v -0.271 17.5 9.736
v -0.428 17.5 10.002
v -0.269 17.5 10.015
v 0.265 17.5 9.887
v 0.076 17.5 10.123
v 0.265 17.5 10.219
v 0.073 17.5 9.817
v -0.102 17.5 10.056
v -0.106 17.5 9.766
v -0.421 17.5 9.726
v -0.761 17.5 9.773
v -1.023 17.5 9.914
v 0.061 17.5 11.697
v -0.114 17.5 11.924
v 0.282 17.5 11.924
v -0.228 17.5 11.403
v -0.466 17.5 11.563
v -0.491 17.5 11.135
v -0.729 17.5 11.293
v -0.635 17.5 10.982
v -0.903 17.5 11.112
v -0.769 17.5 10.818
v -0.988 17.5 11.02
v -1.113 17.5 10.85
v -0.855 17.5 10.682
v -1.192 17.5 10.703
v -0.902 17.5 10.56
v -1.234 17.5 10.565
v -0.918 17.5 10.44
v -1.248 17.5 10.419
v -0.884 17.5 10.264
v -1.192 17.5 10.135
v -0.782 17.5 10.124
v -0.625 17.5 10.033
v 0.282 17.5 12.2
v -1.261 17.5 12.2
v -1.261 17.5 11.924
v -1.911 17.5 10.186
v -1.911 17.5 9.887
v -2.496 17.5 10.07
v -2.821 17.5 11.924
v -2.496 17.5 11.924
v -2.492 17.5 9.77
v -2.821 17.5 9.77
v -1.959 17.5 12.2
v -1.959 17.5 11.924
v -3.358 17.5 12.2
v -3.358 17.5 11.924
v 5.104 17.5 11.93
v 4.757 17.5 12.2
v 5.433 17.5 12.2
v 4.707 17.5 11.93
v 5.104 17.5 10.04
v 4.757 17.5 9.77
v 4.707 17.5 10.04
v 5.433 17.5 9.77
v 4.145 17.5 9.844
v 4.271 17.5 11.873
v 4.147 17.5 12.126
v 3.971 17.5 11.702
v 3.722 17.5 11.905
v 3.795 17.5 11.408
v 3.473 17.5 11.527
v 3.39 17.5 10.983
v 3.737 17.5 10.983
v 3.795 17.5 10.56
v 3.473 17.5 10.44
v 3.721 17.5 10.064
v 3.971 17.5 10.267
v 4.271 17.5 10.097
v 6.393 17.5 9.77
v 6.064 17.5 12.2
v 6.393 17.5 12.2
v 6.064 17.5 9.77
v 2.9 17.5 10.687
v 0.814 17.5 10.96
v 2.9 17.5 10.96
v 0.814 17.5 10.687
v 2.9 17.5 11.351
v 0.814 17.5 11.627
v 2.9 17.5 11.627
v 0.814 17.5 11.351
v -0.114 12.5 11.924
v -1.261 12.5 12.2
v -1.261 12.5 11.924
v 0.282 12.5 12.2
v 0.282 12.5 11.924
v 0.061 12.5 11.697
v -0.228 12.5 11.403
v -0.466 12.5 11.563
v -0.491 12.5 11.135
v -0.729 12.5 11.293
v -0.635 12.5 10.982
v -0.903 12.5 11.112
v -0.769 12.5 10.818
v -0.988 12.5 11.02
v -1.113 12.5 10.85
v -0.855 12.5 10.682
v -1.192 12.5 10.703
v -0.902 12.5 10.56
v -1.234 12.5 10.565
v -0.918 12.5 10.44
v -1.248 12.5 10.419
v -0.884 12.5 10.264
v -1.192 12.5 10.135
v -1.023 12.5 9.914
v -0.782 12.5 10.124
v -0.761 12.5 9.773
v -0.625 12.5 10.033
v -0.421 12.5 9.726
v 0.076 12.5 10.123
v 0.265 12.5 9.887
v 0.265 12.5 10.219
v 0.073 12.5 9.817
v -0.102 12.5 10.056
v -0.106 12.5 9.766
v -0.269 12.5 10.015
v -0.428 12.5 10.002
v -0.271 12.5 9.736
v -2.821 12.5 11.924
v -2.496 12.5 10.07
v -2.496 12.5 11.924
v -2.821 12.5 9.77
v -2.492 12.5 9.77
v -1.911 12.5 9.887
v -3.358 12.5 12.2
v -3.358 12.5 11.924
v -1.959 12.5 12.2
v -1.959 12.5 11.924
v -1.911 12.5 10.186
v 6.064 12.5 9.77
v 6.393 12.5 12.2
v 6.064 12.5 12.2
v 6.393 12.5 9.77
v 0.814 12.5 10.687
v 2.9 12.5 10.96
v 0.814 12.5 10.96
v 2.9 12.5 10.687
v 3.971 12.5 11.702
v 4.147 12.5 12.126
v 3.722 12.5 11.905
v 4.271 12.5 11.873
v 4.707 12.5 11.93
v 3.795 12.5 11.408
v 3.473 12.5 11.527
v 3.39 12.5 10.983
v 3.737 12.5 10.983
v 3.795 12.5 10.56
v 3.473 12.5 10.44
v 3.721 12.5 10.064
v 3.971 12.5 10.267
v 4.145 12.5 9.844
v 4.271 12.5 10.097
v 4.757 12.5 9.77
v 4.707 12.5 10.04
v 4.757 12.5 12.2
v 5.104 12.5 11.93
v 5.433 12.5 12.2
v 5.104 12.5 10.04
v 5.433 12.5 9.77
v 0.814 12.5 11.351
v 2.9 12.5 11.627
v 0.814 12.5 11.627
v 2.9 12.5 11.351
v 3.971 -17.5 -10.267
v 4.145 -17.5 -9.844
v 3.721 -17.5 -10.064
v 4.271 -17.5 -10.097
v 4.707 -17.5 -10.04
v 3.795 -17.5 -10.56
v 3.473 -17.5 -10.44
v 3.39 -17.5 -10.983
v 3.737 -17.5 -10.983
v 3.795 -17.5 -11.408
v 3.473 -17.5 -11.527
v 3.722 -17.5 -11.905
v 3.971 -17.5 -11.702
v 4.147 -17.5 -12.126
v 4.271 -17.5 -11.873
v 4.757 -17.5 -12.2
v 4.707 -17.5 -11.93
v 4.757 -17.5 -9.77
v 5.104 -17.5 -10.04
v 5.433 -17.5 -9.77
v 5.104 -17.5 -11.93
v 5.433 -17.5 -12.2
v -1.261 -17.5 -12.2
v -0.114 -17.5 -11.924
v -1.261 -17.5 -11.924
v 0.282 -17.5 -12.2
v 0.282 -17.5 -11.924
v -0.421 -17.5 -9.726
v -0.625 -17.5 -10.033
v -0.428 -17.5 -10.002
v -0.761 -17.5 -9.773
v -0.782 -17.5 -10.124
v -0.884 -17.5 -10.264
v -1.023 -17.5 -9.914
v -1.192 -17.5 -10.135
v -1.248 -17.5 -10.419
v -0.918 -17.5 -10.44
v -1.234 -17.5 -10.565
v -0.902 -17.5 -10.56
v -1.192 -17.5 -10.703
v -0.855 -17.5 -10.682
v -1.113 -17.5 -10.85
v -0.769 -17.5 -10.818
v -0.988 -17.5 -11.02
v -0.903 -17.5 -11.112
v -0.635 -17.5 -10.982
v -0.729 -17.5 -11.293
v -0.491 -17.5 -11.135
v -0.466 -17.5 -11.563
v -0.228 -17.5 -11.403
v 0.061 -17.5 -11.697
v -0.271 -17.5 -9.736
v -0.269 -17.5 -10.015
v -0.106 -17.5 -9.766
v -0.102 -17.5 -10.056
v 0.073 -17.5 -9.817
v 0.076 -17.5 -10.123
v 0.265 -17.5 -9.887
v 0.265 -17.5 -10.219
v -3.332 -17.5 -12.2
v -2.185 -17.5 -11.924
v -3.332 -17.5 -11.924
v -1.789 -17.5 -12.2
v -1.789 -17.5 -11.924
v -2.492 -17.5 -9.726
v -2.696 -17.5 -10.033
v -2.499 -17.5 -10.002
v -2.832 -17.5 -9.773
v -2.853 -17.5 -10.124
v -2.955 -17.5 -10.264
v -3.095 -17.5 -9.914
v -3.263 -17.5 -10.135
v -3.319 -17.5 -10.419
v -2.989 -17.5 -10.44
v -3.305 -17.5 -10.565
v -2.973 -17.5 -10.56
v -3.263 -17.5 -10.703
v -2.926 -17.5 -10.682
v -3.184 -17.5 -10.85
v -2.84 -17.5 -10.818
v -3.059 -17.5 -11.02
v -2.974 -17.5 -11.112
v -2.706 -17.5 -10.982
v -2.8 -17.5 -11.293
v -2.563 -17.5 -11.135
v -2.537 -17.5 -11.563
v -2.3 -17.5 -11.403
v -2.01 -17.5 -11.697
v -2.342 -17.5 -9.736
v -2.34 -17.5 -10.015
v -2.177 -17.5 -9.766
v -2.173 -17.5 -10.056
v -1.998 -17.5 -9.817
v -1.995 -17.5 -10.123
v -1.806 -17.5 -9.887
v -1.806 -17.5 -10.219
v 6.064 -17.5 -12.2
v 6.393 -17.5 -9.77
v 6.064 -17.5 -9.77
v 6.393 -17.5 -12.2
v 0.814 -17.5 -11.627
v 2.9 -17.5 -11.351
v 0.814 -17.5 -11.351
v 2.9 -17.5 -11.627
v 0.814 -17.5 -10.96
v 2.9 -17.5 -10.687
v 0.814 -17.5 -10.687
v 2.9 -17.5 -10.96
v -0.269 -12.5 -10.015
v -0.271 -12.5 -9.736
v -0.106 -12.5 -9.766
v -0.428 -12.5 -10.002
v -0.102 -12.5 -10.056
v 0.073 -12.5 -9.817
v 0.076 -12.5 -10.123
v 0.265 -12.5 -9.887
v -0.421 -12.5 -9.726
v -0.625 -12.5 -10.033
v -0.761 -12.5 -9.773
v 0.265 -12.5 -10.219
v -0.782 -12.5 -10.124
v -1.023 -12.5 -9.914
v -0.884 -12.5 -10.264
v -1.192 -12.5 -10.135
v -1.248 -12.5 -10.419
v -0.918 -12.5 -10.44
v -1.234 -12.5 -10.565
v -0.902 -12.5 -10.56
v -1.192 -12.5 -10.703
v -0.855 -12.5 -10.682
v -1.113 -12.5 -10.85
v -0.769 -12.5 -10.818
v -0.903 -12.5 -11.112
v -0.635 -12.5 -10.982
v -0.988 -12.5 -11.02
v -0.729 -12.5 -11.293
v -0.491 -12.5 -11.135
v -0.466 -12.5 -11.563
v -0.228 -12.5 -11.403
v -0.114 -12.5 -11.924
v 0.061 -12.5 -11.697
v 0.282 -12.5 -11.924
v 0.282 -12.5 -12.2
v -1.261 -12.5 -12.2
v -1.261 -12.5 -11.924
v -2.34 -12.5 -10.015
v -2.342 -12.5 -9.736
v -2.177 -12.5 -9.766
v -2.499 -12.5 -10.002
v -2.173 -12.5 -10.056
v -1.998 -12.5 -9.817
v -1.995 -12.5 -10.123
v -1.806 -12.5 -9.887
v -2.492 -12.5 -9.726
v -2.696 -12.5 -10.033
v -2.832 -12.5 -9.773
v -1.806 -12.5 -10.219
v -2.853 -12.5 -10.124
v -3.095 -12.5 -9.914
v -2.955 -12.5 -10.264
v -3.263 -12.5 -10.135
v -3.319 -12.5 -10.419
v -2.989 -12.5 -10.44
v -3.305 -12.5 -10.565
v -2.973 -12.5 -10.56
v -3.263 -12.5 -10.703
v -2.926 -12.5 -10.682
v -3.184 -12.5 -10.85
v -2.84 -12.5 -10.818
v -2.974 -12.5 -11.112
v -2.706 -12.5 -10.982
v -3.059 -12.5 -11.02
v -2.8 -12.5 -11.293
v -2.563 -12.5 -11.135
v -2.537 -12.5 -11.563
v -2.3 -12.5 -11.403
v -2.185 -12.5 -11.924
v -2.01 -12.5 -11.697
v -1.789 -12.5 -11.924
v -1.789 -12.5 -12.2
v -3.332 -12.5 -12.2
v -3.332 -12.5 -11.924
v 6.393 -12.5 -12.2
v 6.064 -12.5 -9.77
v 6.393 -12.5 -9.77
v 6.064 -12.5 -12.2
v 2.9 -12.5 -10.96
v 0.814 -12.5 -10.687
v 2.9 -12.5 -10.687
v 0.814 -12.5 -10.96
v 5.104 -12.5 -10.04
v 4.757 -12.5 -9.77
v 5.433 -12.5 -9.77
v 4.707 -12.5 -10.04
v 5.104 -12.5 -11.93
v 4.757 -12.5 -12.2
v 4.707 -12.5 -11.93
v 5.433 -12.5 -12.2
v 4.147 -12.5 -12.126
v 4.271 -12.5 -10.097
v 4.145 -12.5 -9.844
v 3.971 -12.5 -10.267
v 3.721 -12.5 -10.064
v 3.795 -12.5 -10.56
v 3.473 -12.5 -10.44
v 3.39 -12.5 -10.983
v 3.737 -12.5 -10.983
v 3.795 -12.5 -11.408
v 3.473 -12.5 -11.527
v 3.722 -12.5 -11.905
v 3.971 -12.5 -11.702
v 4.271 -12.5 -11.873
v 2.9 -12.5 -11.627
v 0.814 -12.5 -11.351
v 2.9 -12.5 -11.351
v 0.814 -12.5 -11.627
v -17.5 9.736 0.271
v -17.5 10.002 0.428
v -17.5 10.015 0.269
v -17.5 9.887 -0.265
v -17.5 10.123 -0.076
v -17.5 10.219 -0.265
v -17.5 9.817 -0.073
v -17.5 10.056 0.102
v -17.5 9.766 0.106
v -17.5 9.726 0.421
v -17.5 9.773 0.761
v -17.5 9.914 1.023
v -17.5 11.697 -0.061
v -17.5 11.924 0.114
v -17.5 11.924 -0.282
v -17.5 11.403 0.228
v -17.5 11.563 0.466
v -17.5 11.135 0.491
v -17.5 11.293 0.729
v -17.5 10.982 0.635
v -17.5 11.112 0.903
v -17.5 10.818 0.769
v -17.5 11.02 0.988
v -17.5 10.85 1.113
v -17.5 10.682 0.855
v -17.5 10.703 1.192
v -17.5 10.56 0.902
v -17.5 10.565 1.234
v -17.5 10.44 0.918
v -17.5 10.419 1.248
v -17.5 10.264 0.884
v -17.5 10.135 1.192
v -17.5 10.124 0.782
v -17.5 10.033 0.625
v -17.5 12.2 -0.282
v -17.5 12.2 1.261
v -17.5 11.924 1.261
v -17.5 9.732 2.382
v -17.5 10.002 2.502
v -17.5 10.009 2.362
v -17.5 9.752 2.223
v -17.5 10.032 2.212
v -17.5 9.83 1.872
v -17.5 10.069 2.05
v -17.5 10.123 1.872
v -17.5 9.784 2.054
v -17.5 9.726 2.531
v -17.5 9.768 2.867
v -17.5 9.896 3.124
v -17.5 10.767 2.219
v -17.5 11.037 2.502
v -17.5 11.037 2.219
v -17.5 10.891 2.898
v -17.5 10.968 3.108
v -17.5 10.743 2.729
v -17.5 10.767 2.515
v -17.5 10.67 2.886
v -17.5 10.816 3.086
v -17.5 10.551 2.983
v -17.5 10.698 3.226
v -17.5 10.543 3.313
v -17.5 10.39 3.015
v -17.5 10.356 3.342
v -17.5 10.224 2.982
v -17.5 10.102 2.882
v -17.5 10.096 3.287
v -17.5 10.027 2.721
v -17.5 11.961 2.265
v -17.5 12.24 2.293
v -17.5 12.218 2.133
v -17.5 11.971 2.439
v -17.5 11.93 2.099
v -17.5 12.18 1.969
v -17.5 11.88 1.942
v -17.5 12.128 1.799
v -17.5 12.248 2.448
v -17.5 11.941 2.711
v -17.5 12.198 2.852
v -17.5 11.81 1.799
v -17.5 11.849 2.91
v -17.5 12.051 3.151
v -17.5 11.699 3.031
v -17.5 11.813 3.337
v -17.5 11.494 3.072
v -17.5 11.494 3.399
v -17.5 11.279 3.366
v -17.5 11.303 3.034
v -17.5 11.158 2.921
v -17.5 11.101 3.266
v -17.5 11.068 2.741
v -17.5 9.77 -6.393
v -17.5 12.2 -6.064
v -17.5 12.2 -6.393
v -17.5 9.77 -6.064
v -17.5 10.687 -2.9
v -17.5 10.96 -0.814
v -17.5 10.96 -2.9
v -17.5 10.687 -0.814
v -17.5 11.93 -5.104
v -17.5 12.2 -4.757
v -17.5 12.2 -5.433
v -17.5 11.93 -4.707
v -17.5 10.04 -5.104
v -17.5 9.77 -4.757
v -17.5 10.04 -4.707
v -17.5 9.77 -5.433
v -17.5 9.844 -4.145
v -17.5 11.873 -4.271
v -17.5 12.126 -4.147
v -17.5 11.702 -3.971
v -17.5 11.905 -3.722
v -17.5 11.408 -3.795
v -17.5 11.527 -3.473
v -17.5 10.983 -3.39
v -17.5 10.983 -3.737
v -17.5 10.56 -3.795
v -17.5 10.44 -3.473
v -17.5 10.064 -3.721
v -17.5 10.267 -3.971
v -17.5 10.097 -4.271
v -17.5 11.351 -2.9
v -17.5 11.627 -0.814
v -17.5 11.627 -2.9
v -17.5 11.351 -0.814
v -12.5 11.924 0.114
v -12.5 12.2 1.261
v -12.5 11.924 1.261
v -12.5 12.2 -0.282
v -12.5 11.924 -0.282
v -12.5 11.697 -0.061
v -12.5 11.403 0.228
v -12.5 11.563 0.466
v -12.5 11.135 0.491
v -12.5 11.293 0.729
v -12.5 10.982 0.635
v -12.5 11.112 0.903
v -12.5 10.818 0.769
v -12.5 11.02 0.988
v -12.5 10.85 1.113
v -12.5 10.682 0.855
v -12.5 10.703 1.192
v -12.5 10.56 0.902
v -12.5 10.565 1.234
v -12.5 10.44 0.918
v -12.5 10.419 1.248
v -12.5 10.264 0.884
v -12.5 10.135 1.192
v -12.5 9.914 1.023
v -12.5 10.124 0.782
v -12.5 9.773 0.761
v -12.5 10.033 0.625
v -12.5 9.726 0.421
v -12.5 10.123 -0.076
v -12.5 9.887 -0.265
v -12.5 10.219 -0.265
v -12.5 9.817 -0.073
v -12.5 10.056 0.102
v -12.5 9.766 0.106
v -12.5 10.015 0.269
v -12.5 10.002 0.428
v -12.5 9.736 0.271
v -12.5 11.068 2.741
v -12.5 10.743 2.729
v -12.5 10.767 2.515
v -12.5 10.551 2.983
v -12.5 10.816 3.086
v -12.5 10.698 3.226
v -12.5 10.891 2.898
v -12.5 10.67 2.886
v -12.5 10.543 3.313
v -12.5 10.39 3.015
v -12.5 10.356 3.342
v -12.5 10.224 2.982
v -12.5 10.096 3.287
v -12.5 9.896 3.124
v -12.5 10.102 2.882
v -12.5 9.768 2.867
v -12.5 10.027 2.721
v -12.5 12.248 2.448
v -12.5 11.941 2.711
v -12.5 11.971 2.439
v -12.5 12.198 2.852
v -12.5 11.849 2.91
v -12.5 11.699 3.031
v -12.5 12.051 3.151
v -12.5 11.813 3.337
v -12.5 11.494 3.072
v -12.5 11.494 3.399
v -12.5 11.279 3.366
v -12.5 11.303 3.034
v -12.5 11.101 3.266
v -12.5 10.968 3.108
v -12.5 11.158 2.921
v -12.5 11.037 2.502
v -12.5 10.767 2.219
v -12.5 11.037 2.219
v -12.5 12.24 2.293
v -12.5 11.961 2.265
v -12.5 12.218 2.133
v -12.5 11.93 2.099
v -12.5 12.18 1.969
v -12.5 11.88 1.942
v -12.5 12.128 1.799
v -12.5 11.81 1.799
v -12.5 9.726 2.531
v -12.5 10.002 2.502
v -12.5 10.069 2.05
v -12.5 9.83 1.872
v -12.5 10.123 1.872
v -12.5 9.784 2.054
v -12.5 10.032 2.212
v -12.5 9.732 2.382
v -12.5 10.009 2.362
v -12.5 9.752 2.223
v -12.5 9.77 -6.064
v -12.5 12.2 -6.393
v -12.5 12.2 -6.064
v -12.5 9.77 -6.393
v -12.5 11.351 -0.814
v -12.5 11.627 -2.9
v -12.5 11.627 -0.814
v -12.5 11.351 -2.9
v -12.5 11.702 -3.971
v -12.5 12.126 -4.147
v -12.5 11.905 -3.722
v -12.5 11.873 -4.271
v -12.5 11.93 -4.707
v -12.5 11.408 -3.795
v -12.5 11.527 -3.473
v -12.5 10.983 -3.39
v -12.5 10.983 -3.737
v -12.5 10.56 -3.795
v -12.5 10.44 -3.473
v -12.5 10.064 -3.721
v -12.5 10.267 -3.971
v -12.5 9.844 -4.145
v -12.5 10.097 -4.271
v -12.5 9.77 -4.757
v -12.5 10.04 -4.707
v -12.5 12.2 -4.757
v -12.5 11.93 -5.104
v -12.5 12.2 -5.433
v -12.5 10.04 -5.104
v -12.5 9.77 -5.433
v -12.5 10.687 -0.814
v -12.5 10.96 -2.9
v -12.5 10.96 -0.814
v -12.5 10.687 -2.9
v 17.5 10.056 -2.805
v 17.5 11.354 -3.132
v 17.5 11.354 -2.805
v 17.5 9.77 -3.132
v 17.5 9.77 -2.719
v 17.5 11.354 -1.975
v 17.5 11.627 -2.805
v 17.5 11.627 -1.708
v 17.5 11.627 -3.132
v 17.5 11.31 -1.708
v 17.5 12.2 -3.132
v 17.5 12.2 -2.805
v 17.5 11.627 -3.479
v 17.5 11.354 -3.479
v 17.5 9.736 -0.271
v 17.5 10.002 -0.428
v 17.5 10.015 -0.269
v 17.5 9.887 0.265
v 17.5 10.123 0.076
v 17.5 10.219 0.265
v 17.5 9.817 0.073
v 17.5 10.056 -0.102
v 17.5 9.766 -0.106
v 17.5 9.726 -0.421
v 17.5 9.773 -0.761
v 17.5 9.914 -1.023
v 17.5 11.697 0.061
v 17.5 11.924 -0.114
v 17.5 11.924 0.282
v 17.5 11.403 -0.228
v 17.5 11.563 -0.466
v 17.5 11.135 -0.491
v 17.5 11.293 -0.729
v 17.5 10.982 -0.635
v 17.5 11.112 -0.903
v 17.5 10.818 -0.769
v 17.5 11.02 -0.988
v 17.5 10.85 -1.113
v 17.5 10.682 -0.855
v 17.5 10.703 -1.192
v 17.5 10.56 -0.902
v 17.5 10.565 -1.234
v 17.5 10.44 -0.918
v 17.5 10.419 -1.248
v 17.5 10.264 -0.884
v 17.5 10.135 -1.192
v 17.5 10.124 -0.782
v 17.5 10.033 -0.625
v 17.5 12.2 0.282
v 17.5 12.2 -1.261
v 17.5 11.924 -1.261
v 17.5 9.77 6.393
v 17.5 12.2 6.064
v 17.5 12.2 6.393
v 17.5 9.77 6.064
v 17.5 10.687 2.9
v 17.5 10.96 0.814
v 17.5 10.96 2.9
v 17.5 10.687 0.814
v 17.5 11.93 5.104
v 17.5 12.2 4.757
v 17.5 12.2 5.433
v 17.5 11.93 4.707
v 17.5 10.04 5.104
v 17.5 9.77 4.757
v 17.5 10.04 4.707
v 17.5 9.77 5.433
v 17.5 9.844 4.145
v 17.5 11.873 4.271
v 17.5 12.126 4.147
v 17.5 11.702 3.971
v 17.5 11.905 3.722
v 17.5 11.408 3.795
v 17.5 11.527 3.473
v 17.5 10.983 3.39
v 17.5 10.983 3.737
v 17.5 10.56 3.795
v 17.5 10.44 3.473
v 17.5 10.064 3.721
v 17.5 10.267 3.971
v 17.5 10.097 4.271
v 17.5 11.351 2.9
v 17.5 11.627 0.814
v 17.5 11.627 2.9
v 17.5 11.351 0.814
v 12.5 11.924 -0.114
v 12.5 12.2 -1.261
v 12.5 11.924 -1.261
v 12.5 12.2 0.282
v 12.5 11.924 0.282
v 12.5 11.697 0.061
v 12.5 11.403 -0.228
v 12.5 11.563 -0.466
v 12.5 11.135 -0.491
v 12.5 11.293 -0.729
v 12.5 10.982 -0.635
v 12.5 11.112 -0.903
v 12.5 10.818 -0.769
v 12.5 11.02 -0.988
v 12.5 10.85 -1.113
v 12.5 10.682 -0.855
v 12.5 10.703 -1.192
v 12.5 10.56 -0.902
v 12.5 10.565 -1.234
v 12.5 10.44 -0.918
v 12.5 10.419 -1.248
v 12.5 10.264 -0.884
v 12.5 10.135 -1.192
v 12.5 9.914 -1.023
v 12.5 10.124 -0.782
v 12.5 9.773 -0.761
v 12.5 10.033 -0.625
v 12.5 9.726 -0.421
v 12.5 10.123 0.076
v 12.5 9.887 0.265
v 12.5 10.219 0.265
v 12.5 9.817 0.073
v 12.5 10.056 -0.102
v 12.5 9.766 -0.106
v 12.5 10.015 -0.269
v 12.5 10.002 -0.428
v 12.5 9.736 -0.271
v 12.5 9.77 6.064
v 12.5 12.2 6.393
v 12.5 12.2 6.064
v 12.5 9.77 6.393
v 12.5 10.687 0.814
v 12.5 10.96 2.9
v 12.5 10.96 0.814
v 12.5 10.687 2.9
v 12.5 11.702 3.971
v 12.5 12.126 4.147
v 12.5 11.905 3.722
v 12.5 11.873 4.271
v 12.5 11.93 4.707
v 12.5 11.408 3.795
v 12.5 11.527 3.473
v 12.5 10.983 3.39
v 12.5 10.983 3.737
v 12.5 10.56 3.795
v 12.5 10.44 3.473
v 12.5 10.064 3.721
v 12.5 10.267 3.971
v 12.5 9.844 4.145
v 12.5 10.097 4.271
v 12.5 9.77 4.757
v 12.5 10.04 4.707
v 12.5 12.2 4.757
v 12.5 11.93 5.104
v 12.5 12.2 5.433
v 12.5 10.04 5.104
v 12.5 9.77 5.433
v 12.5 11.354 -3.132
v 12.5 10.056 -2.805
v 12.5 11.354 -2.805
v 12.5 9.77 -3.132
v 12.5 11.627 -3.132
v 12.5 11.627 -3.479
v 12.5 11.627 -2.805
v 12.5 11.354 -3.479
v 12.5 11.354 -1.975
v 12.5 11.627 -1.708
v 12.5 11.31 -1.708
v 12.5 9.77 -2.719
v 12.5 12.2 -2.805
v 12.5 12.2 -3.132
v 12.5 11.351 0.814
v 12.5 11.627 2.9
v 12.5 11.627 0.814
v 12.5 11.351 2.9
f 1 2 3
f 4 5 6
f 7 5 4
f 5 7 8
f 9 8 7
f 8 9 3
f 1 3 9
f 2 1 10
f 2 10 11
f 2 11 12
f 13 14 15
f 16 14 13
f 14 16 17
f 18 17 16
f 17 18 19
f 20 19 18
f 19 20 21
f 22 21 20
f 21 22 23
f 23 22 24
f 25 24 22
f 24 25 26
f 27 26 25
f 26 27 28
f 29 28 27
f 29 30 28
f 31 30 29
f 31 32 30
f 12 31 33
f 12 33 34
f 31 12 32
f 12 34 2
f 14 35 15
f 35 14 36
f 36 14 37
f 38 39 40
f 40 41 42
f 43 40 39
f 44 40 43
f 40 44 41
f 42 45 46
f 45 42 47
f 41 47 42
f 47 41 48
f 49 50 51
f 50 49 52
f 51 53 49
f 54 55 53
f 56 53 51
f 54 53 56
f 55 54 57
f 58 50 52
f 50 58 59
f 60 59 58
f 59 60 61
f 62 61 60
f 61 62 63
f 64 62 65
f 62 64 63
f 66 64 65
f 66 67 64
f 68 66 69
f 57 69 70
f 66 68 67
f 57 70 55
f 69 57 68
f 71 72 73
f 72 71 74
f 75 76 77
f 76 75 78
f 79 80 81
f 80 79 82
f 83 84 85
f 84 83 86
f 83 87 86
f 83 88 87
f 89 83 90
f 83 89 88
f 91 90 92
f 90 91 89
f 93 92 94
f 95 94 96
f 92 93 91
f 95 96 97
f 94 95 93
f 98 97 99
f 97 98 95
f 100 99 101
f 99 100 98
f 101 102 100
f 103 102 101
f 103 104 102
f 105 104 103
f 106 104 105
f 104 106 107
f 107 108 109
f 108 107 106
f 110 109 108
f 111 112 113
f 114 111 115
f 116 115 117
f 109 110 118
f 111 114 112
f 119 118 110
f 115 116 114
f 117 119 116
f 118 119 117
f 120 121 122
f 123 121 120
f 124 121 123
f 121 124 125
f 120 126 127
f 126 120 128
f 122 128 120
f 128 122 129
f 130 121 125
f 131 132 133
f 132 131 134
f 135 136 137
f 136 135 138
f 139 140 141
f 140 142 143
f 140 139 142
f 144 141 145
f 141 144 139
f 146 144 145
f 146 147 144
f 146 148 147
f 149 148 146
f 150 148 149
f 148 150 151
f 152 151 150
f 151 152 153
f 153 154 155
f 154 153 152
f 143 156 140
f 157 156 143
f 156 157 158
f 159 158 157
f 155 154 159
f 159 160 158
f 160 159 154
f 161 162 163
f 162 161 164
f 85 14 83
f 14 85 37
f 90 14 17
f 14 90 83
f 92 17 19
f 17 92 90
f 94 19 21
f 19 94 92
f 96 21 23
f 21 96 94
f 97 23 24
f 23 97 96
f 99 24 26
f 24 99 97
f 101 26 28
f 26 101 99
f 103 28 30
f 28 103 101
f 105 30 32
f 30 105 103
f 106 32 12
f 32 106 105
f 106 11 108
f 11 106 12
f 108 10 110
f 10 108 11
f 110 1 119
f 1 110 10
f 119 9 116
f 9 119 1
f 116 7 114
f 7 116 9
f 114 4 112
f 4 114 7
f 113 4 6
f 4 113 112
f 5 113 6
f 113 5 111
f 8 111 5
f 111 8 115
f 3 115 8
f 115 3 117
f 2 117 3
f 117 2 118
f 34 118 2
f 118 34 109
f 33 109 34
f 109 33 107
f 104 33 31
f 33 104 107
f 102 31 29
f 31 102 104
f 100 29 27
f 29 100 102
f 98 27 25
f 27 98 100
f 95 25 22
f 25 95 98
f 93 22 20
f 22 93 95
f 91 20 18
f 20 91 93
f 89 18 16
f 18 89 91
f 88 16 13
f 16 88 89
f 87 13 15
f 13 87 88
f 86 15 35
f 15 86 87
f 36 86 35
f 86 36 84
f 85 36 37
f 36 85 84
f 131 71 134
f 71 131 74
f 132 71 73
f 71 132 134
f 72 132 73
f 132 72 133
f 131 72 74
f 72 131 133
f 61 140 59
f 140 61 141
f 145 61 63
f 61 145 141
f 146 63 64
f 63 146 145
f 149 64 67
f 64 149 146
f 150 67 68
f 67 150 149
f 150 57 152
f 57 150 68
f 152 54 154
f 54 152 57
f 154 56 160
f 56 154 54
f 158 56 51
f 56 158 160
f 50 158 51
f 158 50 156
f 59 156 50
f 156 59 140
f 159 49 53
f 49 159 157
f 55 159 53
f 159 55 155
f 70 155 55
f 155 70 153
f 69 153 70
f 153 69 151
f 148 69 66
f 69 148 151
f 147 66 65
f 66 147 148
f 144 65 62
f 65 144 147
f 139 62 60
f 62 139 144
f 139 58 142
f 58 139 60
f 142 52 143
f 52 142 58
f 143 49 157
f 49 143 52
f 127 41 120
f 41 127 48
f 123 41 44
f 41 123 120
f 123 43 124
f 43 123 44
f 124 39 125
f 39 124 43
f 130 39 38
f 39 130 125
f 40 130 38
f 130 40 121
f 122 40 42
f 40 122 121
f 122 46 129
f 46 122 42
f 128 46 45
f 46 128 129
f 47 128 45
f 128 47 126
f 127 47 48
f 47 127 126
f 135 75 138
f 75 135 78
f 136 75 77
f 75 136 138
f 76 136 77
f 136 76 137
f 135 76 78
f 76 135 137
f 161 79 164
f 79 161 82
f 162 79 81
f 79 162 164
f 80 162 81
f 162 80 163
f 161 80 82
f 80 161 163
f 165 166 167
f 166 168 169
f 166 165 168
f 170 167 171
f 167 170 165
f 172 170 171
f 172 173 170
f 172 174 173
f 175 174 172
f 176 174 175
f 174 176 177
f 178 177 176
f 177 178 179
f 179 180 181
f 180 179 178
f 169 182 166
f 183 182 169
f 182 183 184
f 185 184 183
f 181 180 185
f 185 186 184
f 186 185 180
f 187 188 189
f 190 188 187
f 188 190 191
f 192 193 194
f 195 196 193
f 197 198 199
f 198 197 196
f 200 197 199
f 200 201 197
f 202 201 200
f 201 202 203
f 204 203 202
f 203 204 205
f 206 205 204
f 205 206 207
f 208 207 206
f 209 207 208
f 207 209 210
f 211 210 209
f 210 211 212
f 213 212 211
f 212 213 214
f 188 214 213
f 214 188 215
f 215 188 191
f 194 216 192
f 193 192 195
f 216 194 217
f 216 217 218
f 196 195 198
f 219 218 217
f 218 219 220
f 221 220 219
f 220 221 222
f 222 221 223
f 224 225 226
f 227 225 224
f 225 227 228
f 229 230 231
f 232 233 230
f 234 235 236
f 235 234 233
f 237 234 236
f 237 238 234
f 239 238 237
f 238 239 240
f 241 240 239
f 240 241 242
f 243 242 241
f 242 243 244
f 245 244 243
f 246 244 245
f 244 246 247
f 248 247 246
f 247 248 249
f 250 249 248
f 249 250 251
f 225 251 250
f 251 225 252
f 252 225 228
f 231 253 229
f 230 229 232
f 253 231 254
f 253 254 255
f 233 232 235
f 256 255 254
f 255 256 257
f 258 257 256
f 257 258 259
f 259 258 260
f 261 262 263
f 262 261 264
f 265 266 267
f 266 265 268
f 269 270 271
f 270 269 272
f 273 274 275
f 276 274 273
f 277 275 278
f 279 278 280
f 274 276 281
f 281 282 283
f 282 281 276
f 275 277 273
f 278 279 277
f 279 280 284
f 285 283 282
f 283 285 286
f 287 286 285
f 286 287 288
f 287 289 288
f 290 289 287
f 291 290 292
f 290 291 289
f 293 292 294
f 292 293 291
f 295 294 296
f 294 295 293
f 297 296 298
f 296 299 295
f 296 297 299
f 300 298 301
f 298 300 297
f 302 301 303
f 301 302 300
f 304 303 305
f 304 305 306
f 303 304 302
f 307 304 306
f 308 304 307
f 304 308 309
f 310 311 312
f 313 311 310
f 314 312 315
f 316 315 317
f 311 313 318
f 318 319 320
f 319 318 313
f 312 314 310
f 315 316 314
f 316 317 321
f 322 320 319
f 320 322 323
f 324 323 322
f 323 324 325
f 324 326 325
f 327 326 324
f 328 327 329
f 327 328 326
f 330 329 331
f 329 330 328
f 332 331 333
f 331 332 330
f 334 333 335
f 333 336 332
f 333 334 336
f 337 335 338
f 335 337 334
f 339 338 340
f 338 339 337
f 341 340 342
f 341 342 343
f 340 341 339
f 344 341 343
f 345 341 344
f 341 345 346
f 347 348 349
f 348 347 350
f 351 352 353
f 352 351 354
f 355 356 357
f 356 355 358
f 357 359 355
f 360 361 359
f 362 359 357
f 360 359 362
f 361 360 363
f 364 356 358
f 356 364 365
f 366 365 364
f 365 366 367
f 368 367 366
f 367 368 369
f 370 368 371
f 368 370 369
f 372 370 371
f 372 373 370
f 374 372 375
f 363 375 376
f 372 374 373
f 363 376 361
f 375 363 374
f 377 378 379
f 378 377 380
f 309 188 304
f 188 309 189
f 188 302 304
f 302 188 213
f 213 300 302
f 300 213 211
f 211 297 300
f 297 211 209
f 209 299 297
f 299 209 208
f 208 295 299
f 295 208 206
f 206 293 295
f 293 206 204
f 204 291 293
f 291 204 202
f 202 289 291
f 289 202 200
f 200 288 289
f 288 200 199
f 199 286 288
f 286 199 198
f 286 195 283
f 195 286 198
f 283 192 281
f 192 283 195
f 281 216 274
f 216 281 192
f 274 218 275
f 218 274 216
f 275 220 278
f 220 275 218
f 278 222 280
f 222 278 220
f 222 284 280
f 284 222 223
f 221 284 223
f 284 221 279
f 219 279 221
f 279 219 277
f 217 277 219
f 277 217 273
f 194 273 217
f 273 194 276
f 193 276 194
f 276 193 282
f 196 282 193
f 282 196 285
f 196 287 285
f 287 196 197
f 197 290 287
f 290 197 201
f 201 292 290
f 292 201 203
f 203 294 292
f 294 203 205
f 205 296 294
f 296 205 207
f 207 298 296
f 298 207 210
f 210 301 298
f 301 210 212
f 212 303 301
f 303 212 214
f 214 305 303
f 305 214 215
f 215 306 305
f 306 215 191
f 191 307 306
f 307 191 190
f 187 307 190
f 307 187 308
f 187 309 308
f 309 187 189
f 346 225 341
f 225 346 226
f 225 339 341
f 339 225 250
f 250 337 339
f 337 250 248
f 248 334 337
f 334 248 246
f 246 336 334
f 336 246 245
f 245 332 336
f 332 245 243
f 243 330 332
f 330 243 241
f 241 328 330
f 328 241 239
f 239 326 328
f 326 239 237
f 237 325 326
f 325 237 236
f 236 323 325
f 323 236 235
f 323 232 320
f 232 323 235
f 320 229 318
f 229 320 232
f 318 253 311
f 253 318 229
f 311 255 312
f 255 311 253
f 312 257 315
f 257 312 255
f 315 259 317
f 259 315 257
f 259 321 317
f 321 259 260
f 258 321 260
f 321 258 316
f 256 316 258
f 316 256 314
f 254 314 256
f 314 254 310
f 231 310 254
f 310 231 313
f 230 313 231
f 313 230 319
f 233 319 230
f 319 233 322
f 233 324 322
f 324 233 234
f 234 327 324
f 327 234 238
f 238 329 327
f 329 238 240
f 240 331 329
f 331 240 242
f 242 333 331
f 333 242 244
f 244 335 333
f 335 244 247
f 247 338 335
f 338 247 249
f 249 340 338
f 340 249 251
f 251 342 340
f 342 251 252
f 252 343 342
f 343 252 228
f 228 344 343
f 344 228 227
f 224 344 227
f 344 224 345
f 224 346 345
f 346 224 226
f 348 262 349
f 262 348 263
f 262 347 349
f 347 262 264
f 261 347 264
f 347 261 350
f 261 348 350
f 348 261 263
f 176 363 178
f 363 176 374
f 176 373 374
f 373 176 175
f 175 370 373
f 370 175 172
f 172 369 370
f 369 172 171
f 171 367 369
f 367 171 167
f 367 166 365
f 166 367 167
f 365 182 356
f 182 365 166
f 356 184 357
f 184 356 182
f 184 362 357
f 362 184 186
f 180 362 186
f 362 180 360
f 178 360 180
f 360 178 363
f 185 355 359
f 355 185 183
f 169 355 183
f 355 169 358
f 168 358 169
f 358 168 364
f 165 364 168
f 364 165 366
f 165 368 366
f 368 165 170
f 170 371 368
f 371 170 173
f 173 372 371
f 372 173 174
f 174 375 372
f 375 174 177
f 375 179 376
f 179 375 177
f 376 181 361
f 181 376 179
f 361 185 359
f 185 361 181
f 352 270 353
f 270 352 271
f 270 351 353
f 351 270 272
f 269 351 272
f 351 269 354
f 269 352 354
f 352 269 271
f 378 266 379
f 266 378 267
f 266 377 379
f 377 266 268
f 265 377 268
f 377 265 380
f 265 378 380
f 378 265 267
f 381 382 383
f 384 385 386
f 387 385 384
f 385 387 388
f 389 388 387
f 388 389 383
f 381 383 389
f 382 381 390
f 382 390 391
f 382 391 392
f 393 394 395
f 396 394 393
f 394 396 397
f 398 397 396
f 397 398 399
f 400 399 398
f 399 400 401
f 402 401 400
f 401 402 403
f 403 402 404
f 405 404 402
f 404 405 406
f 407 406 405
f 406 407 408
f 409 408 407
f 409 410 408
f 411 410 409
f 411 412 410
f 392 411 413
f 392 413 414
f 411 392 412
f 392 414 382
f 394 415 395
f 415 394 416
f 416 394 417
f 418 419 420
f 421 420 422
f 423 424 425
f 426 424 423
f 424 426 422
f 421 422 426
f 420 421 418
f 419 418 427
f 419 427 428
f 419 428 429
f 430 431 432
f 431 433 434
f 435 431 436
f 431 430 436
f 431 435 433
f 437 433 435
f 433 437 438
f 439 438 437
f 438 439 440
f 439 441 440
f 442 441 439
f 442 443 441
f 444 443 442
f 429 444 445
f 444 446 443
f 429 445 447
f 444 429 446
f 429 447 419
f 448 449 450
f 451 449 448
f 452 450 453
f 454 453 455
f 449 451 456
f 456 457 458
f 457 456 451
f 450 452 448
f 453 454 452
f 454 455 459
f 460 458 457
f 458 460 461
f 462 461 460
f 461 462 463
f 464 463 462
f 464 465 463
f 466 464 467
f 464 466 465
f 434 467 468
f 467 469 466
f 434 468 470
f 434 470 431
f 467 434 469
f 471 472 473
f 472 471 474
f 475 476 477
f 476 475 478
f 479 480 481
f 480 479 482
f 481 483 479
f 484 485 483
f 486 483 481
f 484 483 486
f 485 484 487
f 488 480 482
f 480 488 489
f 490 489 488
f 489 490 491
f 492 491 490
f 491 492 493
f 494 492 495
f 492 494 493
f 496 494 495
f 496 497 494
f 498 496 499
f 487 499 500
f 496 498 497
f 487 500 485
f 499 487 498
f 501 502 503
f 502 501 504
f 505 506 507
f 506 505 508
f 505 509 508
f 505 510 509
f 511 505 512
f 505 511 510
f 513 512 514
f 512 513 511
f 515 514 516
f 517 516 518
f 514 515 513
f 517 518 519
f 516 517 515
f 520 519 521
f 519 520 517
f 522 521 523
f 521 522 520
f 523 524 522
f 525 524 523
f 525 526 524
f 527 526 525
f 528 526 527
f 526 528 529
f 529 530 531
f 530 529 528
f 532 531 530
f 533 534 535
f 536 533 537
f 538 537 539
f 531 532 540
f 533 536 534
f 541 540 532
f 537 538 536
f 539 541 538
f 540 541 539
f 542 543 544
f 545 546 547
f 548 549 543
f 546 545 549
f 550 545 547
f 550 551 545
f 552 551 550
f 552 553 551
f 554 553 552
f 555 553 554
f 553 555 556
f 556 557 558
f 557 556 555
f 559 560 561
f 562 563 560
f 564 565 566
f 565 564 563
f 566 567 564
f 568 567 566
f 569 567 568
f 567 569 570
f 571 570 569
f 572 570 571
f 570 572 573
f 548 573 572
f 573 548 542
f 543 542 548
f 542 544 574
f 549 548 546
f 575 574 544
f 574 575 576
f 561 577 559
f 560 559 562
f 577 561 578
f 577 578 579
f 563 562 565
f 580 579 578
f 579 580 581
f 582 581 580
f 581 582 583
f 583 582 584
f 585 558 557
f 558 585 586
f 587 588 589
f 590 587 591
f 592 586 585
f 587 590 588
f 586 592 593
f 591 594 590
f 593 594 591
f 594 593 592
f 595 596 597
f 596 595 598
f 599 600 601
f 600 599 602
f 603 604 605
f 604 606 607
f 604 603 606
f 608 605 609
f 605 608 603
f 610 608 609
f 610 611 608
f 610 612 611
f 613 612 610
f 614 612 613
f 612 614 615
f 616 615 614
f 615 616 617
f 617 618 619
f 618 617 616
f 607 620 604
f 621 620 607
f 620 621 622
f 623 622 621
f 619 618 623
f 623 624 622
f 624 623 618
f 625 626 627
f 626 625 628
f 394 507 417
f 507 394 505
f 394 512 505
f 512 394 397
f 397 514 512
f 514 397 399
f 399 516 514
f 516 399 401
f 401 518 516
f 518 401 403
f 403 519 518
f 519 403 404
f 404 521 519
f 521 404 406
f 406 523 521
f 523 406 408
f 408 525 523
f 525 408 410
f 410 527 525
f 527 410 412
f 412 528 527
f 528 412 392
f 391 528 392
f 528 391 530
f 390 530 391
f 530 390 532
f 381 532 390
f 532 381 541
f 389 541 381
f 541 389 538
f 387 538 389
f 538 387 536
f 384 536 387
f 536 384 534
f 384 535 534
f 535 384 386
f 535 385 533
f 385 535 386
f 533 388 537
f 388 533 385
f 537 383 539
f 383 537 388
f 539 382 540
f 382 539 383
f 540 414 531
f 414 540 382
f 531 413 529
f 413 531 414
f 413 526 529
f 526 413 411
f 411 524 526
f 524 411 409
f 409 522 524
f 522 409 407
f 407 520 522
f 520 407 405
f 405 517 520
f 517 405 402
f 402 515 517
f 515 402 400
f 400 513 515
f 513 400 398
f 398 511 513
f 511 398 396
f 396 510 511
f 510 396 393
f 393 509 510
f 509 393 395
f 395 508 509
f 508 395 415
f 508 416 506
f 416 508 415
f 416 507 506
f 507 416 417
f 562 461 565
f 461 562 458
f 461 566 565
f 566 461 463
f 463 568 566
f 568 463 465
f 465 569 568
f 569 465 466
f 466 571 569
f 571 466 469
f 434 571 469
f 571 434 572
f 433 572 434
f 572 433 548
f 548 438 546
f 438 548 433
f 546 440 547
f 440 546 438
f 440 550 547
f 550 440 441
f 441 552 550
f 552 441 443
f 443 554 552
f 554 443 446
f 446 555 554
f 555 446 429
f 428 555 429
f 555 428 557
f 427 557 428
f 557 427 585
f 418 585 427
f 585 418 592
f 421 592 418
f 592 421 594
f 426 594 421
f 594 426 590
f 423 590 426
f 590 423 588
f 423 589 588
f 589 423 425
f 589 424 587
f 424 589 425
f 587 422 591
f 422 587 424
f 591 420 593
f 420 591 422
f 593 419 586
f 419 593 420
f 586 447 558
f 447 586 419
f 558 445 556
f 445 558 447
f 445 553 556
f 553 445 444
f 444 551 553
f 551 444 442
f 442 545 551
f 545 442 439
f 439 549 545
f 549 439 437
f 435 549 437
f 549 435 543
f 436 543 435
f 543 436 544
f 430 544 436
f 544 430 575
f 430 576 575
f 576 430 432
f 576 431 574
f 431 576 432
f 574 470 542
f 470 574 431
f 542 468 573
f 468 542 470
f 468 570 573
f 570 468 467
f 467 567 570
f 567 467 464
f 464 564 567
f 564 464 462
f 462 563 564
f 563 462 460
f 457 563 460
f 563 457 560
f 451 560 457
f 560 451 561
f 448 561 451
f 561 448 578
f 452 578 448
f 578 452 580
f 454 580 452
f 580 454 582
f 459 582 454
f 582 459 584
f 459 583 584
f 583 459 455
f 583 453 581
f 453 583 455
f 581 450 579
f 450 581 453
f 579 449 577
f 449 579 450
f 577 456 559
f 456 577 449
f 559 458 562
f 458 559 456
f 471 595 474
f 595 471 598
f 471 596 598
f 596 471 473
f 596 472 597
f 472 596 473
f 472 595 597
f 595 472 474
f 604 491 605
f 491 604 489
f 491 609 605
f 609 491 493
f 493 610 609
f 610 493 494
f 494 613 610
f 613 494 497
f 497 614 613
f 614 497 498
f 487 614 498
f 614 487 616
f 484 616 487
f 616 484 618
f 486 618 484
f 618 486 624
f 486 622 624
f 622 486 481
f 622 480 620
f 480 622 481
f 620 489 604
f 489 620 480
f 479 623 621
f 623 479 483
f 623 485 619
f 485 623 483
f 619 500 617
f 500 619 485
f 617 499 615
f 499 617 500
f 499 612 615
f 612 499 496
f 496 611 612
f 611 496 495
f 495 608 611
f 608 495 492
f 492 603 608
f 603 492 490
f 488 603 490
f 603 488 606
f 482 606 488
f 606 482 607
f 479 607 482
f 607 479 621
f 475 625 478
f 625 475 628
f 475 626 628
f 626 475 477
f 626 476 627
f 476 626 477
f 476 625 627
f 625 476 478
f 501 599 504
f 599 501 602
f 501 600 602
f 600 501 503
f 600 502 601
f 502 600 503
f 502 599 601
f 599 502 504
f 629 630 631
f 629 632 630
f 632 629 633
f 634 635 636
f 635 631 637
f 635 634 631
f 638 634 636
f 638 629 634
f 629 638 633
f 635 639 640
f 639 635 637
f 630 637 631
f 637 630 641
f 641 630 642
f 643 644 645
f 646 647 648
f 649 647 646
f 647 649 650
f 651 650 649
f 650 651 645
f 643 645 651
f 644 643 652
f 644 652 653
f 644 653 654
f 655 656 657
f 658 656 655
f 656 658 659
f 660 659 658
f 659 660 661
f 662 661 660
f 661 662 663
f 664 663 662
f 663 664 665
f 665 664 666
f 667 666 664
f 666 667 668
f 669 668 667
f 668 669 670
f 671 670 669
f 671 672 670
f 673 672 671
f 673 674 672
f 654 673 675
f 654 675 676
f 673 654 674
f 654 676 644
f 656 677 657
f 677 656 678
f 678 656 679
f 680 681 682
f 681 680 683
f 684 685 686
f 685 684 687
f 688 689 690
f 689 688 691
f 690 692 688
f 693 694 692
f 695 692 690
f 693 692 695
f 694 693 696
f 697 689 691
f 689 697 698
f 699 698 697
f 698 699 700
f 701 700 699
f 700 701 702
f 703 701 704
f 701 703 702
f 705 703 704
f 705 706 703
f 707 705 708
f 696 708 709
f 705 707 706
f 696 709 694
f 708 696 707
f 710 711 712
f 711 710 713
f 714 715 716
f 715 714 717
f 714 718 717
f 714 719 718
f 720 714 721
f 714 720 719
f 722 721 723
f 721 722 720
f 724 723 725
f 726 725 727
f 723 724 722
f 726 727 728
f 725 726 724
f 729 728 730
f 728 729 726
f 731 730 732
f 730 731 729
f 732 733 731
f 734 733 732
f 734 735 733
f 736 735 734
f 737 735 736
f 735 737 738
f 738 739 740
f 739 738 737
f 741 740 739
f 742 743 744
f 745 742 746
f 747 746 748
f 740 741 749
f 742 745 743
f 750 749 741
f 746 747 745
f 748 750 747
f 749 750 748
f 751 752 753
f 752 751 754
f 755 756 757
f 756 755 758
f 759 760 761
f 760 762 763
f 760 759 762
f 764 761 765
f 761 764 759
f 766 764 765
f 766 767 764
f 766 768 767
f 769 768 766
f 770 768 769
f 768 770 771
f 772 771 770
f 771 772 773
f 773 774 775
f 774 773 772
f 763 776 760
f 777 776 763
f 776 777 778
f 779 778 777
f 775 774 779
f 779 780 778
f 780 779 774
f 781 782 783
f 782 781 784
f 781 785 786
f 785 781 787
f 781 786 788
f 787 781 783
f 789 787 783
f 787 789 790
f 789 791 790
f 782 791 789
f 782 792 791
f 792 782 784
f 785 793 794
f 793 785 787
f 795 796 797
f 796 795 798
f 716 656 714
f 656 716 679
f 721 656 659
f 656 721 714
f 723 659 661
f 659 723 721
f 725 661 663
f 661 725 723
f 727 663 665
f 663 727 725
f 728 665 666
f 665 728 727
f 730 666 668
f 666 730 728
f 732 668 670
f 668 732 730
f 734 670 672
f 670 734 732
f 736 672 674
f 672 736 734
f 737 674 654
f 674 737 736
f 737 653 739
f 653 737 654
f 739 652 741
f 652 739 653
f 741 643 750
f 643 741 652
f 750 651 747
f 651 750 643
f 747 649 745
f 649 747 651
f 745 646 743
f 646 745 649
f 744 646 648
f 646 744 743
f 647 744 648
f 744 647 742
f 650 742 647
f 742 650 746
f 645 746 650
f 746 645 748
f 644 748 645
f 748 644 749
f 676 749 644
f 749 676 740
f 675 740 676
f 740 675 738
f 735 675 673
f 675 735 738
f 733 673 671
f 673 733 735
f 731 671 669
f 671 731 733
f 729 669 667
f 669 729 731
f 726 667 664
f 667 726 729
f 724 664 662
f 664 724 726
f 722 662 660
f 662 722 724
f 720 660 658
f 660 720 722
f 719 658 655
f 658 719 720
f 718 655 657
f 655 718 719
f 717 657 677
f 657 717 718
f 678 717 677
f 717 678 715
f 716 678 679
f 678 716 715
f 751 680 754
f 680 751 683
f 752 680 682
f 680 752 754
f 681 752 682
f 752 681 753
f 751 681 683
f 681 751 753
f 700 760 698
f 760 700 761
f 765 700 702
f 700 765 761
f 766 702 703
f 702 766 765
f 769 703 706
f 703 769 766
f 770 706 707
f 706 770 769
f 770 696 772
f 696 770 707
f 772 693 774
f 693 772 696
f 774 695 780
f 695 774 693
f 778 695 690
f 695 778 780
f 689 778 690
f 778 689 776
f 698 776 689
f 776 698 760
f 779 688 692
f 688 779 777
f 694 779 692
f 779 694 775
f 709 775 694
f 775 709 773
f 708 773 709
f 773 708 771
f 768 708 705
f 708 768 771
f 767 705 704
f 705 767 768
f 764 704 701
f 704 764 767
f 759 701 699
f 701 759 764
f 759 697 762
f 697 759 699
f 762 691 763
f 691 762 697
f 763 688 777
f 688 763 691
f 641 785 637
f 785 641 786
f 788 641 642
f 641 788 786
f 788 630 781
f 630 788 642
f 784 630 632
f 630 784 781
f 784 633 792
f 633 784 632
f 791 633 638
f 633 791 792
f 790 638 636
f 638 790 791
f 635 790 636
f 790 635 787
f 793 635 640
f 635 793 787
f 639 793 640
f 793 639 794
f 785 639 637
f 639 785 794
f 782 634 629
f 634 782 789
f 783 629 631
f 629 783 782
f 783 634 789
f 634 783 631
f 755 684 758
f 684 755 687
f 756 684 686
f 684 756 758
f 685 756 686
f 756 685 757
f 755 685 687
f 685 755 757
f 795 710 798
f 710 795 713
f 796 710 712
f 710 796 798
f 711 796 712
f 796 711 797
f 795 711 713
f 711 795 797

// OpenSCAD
// file: modules.scad
zoom = [0.8,0.8,1];

module white( filename, text)
{
    scale(zoom)
    rotate([0,0,90]) 
    union(){ 
        translate([21.5,-8.4,-2.5])   rotate([0,0,90])  linear_extrude(5)  text (text,font="bold",size=3); 
        intersection() 
        {    
            cube([35,35,5],center=true); 
            translate([3,0,2.6])    scale([0.14,0.14,-1])  
            surface(file = filename, center = true); 
        } 
    } 

};

module black( filename, text)
{
    scale(zoom)
    rotate([0,0,90]) 
    difference() 
    {    
        translate([5,0,0])  cube([35,35,5],center=true); 
        translate([3,0,2.6])    scale([0.14,0.14,-1])  
        surface(file = filename, center = true);
        translate([21.5,-8.4,-2.5])   rotate([0,0,90])  linear_extrude(6)  text (text,font="bold",size=3);
    } 
}

module shape()
{
    scale(zoom)   rotate([0,0,90]) translate([5,0,0])  cube([35,35,5],center=true);  
}
// main file
include <modules.scad>

union() color([0,1,0])
{
    rotate([90,0,0])    translate([0,-5,-15])   white("../aruco/Marker21.png","ID=21");  
    rotate([-90,0,0])    translate([0,-5,-15])  white("../aruco/Marker22.png","ID=22");  
    rotate([00,90,0])    translate([0,-5,-15])  white("../aruco/Marker23.png","ID=23");  
    rotate([00,-90,0])    translate([0,-5,-15]) white("../aruco/Marker24.png","ID=24");  
}
